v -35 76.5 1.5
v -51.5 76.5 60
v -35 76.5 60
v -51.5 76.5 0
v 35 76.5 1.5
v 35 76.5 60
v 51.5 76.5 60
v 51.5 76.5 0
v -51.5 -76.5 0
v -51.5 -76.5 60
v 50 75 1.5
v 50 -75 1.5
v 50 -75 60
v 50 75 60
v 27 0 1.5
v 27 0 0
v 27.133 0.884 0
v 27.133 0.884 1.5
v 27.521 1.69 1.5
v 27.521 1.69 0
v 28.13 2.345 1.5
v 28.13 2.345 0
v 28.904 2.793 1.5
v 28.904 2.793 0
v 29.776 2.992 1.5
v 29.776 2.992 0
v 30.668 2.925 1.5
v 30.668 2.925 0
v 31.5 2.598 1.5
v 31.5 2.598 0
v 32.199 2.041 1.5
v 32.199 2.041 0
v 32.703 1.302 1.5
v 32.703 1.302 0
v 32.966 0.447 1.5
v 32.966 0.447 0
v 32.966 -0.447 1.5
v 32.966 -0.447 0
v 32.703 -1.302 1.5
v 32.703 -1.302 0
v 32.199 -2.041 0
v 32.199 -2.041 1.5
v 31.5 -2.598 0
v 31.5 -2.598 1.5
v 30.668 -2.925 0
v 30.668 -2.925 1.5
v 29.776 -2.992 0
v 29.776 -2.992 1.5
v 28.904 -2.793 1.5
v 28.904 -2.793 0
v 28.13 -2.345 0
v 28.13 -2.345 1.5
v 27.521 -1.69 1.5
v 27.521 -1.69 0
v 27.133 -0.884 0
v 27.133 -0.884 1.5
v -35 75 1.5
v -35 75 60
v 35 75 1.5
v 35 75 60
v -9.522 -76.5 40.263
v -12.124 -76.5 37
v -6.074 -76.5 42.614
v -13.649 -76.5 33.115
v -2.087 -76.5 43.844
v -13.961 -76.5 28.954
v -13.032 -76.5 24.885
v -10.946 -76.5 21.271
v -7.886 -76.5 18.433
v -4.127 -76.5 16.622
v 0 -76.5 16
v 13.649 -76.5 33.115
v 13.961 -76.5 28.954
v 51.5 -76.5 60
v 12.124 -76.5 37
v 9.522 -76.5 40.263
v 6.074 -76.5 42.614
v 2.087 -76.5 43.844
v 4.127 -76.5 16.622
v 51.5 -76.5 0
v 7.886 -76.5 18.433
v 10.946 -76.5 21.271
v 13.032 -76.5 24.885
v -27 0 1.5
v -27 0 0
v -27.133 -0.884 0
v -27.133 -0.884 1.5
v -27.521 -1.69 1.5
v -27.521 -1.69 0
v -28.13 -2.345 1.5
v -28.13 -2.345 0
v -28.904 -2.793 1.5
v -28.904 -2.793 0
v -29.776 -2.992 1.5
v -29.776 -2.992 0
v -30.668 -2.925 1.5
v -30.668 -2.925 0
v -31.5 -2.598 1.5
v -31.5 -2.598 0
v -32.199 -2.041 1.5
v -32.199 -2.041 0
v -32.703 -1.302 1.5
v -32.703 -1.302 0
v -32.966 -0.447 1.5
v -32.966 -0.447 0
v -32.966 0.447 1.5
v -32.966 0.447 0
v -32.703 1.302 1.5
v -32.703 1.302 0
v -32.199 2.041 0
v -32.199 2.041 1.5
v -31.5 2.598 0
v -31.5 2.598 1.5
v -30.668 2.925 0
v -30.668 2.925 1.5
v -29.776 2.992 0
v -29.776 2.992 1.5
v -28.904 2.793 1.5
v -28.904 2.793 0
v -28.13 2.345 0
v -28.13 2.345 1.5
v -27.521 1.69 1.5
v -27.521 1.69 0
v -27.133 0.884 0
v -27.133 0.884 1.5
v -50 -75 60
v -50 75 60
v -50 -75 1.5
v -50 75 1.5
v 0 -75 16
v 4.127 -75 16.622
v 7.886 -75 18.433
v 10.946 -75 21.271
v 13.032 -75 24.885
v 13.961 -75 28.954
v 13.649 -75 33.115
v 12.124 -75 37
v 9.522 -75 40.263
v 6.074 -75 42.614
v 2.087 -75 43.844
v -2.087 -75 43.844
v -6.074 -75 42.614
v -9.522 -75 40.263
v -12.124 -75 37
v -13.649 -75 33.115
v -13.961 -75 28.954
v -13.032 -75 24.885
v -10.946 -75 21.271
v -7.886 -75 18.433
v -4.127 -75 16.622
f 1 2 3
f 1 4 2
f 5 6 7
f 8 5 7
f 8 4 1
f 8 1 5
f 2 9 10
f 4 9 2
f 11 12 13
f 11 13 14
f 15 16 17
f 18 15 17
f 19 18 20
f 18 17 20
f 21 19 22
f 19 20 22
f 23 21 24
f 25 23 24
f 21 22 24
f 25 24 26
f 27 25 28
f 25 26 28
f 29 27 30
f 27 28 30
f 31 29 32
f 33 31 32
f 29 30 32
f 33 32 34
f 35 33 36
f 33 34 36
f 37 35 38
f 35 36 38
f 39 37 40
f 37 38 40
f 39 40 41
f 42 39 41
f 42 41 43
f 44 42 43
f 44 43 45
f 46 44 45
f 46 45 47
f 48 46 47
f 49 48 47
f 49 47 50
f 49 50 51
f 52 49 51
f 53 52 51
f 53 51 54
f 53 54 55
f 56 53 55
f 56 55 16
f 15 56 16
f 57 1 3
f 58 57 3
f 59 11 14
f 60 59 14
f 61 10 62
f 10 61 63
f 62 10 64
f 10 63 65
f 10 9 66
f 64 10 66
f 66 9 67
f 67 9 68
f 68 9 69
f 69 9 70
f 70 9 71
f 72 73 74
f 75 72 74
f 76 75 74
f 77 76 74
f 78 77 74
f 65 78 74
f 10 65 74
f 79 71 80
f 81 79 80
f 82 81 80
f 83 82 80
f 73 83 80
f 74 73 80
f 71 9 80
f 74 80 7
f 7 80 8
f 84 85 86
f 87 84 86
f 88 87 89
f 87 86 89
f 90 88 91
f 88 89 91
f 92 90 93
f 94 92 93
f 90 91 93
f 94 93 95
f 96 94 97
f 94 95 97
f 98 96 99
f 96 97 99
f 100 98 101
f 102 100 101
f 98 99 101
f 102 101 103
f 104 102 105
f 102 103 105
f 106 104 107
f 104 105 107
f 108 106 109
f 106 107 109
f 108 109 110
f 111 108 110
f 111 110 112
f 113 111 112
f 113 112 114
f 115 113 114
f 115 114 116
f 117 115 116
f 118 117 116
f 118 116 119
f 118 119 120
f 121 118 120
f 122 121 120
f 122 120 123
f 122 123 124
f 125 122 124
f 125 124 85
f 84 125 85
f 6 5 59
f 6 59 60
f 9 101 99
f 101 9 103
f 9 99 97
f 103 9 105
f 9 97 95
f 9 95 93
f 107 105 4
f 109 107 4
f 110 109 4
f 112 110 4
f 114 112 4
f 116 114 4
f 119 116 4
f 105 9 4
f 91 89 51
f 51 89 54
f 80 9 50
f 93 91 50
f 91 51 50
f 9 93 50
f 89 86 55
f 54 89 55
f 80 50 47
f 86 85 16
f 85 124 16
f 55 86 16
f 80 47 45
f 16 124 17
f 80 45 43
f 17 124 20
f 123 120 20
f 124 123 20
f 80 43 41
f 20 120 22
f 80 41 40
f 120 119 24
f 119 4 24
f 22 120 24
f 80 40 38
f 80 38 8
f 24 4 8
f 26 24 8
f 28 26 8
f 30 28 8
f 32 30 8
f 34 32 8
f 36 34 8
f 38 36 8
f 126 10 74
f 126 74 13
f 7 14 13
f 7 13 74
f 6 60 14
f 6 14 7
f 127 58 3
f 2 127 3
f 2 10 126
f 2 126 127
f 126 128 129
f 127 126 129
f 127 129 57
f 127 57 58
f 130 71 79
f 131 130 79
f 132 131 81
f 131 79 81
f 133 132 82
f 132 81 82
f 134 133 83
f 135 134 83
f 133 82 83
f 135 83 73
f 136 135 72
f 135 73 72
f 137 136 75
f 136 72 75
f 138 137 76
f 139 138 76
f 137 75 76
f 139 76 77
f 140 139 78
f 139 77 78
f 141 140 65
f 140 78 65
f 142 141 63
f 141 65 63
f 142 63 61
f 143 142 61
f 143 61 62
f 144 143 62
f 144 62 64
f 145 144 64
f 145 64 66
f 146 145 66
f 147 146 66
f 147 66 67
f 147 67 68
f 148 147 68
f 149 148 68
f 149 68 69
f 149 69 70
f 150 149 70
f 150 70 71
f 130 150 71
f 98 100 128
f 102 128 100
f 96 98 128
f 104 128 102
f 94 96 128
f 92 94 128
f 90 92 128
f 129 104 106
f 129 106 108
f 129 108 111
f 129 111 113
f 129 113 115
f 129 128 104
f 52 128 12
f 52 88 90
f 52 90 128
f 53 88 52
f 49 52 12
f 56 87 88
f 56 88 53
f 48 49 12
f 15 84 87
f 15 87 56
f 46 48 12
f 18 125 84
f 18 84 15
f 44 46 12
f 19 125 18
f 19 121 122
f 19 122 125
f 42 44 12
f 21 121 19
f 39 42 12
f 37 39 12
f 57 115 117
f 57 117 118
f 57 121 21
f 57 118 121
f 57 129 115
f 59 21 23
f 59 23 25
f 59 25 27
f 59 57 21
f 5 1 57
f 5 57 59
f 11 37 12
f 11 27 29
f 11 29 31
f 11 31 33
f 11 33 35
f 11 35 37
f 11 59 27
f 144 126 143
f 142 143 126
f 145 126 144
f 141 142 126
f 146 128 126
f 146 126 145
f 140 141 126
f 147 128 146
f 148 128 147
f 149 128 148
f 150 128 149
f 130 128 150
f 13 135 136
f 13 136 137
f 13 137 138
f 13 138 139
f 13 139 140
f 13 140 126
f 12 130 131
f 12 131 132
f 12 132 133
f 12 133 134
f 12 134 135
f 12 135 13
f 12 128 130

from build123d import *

# Parameters (mm, degrees)
SKETCH1_W           = 103
SKETCH1_H           = 153
BOSS_EXTRUDE1_DEPTH = 60
SHELL1_T            = -1.5
CUT_EXTRUDE1_REACH  = 174.224
SKETCH2_R           = 14
SKETCH3_W           = 58.5
SKETCH3_H           = 1.5
BOSS_EXTRUDE2_DEPTH = 15
CUT_EXTRUDE2_REACH  = 112.02
SKETCH4_R           = 3


with BuildPart() as part:
    # Sketch1 → Boss-Extrude1 (new body)
    with BuildSketch(Plane.XY):
        Rectangle(SKETCH1_W, SKETCH1_H)
    extrude(amount=BOSS_EXTRUDE1_DEPTH)

    # Shell1
    shell1_openings = [part.faces().sort_by_distance(p)[0] for p in [
        (0, 0, 60),
        (0, 76.5, 30),
    ]]
    offset(amount=SHELL1_T, openings=shell1_openings, kind=Kind.INTERSECTION)

    # Sketch2 → Cut-Extrude1 (cut, up to next)
    with BuildSketch(Plane.XZ.offset(76.5), mode=Mode.PRIVATE) as cut_extrude1_sk1:
        with Locations(Location((0, 30, 0), (0, 0, 270))):
            Circle(SKETCH2_R)
    cut_extrude1_tool1 = extrude(cut_extrude1_sk1.sketch, amount=-CUT_EXTRUDE1_REACH, mode=Mode.PRIVATE) & part.part
    add(cut_extrude1_tool1.solids().sort_by_distance((0, -76.5, 30))[0], mode=Mode.SUBTRACT)

    # Sketch3 → Boss-Extrude2 (add)
    with BuildSketch(Plane.ZY.offset(-50)):
        with Locations((30.75, 75.75)):
            Rectangle(SKETCH3_W, SKETCH3_H)
    boss_extrude2 = extrude(amount=BOSS_EXTRUDE2_DEPTH)

    # Mirror1: Boss-Extrude2 across plane
    add(boss_extrude2.mirror(Plane(origin=(0, 0, 0), x_dir=(0, 0, 1), z_dir=(1, 0, 0))))

    # Sketch4 → Cut-Extrude2 (cut, up to next)
    with BuildSketch(Plane(origin=(0, 0, 0), x_dir=(-1, 0, 0), z_dir=(0, 0, -1)), mode=Mode.PRIVATE) as cut_extrude2_sk1:
        with Locations((-30, 0)):
            Circle(SKETCH4_R)
    cut_extrude2_tool1 = extrude(cut_extrude2_sk1.sketch, amount=-CUT_EXTRUDE2_REACH, mode=Mode.PRIVATE) & part.part
    # Sketch4 → Cut-Extrude2 (cut, up to next)
    with BuildSketch(Plane(origin=(0, 0, 0), x_dir=(-1, 0, 0), z_dir=(0, 0, -1)), mode=Mode.PRIVATE) as cut_extrude2_sk2:
        with Locations(Location((30, 0, 0), (0, 0, 180))):
            Circle(SKETCH4_R)
    cut_extrude2_tool2 = extrude(cut_extrude2_sk2.sketch, amount=-CUT_EXTRUDE2_REACH, mode=Mode.PRIVATE) & part.part
    add(cut_extrude2_tool1.solids().sort_by_distance((30, 0, 0))[0], mode=Mode.SUBTRACT)
    add(cut_extrude2_tool2.solids().sort_by_distance((-30, 0, 0))[0], mode=Mode.SUBTRACT)


solid = part.part
